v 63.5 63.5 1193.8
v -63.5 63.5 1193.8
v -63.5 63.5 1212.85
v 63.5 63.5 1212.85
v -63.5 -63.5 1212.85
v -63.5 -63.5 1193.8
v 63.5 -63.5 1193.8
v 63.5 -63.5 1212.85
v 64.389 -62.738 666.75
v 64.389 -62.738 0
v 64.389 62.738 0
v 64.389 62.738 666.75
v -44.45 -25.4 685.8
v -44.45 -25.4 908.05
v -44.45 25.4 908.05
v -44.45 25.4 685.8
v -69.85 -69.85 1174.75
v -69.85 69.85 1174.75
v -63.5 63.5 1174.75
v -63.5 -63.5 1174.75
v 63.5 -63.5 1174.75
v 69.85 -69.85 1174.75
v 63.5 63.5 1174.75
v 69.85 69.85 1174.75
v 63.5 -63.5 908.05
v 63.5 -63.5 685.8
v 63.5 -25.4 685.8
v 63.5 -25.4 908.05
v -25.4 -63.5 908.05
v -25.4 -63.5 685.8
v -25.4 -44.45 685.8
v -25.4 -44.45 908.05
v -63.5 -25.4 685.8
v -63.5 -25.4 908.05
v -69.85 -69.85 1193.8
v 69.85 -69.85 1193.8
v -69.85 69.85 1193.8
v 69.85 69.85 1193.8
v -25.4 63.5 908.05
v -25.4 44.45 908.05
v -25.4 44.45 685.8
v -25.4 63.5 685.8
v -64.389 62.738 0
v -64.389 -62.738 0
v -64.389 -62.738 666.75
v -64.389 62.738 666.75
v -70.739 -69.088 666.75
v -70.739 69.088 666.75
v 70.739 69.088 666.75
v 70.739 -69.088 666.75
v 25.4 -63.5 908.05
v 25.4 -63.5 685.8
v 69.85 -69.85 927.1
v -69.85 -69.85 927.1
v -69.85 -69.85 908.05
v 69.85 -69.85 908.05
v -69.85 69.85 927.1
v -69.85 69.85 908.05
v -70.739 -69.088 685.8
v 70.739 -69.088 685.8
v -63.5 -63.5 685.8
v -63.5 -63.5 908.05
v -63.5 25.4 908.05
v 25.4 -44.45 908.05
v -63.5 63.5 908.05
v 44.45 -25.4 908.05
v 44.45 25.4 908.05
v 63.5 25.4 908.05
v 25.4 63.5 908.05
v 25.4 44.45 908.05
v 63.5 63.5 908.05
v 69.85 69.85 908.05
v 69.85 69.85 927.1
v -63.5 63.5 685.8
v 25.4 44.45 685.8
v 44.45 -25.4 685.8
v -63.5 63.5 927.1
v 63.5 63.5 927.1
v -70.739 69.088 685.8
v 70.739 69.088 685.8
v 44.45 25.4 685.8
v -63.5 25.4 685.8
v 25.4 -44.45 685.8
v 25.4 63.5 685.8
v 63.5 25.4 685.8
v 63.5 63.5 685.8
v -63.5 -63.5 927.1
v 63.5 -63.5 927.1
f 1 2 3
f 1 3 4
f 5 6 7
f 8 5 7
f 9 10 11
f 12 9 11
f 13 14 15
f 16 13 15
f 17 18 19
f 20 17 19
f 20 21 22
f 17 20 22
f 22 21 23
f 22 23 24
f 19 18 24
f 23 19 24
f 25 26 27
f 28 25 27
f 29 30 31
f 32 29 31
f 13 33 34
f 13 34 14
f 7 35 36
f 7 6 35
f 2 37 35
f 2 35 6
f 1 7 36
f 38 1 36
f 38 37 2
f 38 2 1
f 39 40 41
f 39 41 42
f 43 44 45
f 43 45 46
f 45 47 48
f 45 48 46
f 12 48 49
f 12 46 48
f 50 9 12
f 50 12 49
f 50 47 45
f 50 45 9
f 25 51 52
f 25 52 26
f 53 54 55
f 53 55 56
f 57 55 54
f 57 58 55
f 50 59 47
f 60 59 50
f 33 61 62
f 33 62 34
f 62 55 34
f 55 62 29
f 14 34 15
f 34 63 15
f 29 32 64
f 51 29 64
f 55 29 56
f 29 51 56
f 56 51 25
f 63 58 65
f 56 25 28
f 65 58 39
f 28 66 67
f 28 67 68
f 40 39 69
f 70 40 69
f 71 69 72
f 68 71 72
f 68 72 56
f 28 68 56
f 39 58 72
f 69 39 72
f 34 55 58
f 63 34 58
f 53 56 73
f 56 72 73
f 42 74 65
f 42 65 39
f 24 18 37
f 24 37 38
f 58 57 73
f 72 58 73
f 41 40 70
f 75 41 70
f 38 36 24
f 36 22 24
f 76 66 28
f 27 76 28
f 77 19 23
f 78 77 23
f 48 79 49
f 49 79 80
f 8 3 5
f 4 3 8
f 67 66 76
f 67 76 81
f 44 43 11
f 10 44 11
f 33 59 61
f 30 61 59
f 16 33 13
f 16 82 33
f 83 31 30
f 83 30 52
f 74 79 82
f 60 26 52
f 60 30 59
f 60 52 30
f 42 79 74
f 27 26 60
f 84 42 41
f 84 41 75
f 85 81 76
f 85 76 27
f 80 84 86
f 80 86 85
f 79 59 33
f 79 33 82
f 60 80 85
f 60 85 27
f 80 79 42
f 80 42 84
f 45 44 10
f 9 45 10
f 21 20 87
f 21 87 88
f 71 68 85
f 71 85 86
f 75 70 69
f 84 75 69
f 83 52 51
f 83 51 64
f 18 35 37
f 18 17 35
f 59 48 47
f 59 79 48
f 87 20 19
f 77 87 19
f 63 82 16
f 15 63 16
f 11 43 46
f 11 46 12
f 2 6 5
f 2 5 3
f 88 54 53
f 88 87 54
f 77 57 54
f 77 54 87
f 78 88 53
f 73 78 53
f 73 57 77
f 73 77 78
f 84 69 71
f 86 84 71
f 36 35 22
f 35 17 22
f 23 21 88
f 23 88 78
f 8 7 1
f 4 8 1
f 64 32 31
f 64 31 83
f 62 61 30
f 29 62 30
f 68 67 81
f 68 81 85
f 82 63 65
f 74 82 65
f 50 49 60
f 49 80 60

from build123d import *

# Parameters (mm, degrees)
F0_W           = 128.778
F0_H           = 125.476
F1_DEPTH       = 673.1
F2_W           = 88.9
F2_H           = 88.9
F3_DEPTH       = 508
F4_W           = 141.4779941578
F4_H           = 138.1759941578
F4_W_2         = 88.9
F4_H_2         = 88.9
F5_DEPTH       = 12.7
F6_W           = 141.4779941578
F6_H           = 138.1759941578
F6_W_2         = 128.778
F6_H_2         = 125.476
F7_DEPTH       = 6.35
F8_W           = 38.1
F8_H           = 38.1
F9_DEPTH       = 495.3
F10_W          = 139.7
F10_H          = 139.7
F10_W_2        = 127
F10_H_2        = 127
F11_DEPTH      = 6.35
F12_W          = 139.7
F12_H          = 139.7
F13_DEPTH      = 12.7
F14_W          = 50.8
F14_H          = 254
F15_DEPTH      = 19.05
F15_DEPTH_BACK = 107.95
F16_W          = 50.8
F16_H          = 254
F17_DEPTH      = 19.05
F17_DEPTH_BACK = 107.95
F18_W          = 139.7
F18_H          = 19.05
F19_DEPTH      = 133.35
F19_DEPTH_BACK = 6.35
F20_W          = 127
F20_H          = 127
F21_DEPTH      = 19.05


with BuildPart() as f1:
    # F0 (on Top) → F1 (new body)
    with BuildSketch(Plane.XY):
        Rectangle(F0_W, F0_H)
    extrude(amount=F1_DEPTH)

    # F2 (on face) → F3 (join)
    with BuildSketch(Plane.XY.offset(673.1)):
        Rectangle(F2_W, F2_H)
    extrude(amount=F3_DEPTH)

    # F4 (on face) → F5 (join)
    with BuildSketch(Plane.XY.offset(673.1)):
        Rectangle(F4_W, F4_H)
        Rectangle(F4_W_2, F4_H_2, mode=Mode.SUBTRACT)
    extrude(amount=F5_DEPTH)

    # F6 (on face) → F7 (join)
    with BuildSketch(Plane(origin=(0, 0, 673.1), x_dir=(1, 0, 0), z_dir=(0, 0, -1))):
        Rectangle(F6_W, F6_H)
        Rectangle(F6_W_2, F6_H_2, mode=Mode.SUBTRACT)
    extrude(amount=F7_DEPTH)

    # F8 (on face) → F9 (join)
    with BuildSketch(Plane.XY.offset(685.8)):
        with Locations((44.45, 44.45)):
            Rectangle(F8_W, F8_H)
        with Locations((44.45, -44.45)):
            Rectangle(F8_W, F8_H)
        with Locations((-44.45, -44.45)):
            Rectangle(F8_W, F8_H)
        with Locations((-44.45, 44.45)):
            Rectangle(F8_W, F8_H)
    extrude(amount=F9_DEPTH)

    # F10 (on face) → F11 (join)
    with BuildSketch(Plane.XY.offset(1181.1)):
        Rectangle(F10_W, F10_H)
        Rectangle(F10_W_2, F10_H_2, mode=Mode.SUBTRACT)
    extrude(amount=-F11_DEPTH)

    # F12 (on face) → F13 (join)
    with BuildSketch(Plane.XY.offset(1181.1)):
        Rectangle(F12_W, F12_H)
    extrude(amount=F13_DEPTH)

    # F14 (on face) → F15 (join, two sides)
    with BuildSketch(Plane.YZ.offset(44.45)) as f15_sk:
        with Locations((0, 1054.1)):
            Rectangle(F14_W, F14_H)
    extrude(amount=F15_DEPTH)
    extrude(f15_sk.sketch, amount=-F15_DEPTH_BACK)

    # F16 (on face) → F17 (join, two sides)
    with BuildSketch(Plane.XZ.offset(44.45)) as f17_sk:
        with Locations((0, 1054.1)):
            Rectangle(F16_W, F16_H)
    extrude(amount=F17_DEPTH)
    extrude(f17_sk.sketch, amount=-F17_DEPTH_BACK)

    # F18 (on face) → F19 (join, two sides)
    with BuildSketch(Plane.XZ.offset(63.5)) as f19_sk:
        with Locations((0, 917.575)):
            Rectangle(F18_W, F18_H)
    extrude(amount=-F19_DEPTH)
    extrude(f19_sk.sketch, amount=F19_DEPTH_BACK)

    # F20 (on face) → F21 (join)
    with BuildSketch(Plane.XY.offset(1193.8)):
        Rectangle(F20_W, F20_H)
    extrude(amount=F21_DEPTH)


solid = f1.part
